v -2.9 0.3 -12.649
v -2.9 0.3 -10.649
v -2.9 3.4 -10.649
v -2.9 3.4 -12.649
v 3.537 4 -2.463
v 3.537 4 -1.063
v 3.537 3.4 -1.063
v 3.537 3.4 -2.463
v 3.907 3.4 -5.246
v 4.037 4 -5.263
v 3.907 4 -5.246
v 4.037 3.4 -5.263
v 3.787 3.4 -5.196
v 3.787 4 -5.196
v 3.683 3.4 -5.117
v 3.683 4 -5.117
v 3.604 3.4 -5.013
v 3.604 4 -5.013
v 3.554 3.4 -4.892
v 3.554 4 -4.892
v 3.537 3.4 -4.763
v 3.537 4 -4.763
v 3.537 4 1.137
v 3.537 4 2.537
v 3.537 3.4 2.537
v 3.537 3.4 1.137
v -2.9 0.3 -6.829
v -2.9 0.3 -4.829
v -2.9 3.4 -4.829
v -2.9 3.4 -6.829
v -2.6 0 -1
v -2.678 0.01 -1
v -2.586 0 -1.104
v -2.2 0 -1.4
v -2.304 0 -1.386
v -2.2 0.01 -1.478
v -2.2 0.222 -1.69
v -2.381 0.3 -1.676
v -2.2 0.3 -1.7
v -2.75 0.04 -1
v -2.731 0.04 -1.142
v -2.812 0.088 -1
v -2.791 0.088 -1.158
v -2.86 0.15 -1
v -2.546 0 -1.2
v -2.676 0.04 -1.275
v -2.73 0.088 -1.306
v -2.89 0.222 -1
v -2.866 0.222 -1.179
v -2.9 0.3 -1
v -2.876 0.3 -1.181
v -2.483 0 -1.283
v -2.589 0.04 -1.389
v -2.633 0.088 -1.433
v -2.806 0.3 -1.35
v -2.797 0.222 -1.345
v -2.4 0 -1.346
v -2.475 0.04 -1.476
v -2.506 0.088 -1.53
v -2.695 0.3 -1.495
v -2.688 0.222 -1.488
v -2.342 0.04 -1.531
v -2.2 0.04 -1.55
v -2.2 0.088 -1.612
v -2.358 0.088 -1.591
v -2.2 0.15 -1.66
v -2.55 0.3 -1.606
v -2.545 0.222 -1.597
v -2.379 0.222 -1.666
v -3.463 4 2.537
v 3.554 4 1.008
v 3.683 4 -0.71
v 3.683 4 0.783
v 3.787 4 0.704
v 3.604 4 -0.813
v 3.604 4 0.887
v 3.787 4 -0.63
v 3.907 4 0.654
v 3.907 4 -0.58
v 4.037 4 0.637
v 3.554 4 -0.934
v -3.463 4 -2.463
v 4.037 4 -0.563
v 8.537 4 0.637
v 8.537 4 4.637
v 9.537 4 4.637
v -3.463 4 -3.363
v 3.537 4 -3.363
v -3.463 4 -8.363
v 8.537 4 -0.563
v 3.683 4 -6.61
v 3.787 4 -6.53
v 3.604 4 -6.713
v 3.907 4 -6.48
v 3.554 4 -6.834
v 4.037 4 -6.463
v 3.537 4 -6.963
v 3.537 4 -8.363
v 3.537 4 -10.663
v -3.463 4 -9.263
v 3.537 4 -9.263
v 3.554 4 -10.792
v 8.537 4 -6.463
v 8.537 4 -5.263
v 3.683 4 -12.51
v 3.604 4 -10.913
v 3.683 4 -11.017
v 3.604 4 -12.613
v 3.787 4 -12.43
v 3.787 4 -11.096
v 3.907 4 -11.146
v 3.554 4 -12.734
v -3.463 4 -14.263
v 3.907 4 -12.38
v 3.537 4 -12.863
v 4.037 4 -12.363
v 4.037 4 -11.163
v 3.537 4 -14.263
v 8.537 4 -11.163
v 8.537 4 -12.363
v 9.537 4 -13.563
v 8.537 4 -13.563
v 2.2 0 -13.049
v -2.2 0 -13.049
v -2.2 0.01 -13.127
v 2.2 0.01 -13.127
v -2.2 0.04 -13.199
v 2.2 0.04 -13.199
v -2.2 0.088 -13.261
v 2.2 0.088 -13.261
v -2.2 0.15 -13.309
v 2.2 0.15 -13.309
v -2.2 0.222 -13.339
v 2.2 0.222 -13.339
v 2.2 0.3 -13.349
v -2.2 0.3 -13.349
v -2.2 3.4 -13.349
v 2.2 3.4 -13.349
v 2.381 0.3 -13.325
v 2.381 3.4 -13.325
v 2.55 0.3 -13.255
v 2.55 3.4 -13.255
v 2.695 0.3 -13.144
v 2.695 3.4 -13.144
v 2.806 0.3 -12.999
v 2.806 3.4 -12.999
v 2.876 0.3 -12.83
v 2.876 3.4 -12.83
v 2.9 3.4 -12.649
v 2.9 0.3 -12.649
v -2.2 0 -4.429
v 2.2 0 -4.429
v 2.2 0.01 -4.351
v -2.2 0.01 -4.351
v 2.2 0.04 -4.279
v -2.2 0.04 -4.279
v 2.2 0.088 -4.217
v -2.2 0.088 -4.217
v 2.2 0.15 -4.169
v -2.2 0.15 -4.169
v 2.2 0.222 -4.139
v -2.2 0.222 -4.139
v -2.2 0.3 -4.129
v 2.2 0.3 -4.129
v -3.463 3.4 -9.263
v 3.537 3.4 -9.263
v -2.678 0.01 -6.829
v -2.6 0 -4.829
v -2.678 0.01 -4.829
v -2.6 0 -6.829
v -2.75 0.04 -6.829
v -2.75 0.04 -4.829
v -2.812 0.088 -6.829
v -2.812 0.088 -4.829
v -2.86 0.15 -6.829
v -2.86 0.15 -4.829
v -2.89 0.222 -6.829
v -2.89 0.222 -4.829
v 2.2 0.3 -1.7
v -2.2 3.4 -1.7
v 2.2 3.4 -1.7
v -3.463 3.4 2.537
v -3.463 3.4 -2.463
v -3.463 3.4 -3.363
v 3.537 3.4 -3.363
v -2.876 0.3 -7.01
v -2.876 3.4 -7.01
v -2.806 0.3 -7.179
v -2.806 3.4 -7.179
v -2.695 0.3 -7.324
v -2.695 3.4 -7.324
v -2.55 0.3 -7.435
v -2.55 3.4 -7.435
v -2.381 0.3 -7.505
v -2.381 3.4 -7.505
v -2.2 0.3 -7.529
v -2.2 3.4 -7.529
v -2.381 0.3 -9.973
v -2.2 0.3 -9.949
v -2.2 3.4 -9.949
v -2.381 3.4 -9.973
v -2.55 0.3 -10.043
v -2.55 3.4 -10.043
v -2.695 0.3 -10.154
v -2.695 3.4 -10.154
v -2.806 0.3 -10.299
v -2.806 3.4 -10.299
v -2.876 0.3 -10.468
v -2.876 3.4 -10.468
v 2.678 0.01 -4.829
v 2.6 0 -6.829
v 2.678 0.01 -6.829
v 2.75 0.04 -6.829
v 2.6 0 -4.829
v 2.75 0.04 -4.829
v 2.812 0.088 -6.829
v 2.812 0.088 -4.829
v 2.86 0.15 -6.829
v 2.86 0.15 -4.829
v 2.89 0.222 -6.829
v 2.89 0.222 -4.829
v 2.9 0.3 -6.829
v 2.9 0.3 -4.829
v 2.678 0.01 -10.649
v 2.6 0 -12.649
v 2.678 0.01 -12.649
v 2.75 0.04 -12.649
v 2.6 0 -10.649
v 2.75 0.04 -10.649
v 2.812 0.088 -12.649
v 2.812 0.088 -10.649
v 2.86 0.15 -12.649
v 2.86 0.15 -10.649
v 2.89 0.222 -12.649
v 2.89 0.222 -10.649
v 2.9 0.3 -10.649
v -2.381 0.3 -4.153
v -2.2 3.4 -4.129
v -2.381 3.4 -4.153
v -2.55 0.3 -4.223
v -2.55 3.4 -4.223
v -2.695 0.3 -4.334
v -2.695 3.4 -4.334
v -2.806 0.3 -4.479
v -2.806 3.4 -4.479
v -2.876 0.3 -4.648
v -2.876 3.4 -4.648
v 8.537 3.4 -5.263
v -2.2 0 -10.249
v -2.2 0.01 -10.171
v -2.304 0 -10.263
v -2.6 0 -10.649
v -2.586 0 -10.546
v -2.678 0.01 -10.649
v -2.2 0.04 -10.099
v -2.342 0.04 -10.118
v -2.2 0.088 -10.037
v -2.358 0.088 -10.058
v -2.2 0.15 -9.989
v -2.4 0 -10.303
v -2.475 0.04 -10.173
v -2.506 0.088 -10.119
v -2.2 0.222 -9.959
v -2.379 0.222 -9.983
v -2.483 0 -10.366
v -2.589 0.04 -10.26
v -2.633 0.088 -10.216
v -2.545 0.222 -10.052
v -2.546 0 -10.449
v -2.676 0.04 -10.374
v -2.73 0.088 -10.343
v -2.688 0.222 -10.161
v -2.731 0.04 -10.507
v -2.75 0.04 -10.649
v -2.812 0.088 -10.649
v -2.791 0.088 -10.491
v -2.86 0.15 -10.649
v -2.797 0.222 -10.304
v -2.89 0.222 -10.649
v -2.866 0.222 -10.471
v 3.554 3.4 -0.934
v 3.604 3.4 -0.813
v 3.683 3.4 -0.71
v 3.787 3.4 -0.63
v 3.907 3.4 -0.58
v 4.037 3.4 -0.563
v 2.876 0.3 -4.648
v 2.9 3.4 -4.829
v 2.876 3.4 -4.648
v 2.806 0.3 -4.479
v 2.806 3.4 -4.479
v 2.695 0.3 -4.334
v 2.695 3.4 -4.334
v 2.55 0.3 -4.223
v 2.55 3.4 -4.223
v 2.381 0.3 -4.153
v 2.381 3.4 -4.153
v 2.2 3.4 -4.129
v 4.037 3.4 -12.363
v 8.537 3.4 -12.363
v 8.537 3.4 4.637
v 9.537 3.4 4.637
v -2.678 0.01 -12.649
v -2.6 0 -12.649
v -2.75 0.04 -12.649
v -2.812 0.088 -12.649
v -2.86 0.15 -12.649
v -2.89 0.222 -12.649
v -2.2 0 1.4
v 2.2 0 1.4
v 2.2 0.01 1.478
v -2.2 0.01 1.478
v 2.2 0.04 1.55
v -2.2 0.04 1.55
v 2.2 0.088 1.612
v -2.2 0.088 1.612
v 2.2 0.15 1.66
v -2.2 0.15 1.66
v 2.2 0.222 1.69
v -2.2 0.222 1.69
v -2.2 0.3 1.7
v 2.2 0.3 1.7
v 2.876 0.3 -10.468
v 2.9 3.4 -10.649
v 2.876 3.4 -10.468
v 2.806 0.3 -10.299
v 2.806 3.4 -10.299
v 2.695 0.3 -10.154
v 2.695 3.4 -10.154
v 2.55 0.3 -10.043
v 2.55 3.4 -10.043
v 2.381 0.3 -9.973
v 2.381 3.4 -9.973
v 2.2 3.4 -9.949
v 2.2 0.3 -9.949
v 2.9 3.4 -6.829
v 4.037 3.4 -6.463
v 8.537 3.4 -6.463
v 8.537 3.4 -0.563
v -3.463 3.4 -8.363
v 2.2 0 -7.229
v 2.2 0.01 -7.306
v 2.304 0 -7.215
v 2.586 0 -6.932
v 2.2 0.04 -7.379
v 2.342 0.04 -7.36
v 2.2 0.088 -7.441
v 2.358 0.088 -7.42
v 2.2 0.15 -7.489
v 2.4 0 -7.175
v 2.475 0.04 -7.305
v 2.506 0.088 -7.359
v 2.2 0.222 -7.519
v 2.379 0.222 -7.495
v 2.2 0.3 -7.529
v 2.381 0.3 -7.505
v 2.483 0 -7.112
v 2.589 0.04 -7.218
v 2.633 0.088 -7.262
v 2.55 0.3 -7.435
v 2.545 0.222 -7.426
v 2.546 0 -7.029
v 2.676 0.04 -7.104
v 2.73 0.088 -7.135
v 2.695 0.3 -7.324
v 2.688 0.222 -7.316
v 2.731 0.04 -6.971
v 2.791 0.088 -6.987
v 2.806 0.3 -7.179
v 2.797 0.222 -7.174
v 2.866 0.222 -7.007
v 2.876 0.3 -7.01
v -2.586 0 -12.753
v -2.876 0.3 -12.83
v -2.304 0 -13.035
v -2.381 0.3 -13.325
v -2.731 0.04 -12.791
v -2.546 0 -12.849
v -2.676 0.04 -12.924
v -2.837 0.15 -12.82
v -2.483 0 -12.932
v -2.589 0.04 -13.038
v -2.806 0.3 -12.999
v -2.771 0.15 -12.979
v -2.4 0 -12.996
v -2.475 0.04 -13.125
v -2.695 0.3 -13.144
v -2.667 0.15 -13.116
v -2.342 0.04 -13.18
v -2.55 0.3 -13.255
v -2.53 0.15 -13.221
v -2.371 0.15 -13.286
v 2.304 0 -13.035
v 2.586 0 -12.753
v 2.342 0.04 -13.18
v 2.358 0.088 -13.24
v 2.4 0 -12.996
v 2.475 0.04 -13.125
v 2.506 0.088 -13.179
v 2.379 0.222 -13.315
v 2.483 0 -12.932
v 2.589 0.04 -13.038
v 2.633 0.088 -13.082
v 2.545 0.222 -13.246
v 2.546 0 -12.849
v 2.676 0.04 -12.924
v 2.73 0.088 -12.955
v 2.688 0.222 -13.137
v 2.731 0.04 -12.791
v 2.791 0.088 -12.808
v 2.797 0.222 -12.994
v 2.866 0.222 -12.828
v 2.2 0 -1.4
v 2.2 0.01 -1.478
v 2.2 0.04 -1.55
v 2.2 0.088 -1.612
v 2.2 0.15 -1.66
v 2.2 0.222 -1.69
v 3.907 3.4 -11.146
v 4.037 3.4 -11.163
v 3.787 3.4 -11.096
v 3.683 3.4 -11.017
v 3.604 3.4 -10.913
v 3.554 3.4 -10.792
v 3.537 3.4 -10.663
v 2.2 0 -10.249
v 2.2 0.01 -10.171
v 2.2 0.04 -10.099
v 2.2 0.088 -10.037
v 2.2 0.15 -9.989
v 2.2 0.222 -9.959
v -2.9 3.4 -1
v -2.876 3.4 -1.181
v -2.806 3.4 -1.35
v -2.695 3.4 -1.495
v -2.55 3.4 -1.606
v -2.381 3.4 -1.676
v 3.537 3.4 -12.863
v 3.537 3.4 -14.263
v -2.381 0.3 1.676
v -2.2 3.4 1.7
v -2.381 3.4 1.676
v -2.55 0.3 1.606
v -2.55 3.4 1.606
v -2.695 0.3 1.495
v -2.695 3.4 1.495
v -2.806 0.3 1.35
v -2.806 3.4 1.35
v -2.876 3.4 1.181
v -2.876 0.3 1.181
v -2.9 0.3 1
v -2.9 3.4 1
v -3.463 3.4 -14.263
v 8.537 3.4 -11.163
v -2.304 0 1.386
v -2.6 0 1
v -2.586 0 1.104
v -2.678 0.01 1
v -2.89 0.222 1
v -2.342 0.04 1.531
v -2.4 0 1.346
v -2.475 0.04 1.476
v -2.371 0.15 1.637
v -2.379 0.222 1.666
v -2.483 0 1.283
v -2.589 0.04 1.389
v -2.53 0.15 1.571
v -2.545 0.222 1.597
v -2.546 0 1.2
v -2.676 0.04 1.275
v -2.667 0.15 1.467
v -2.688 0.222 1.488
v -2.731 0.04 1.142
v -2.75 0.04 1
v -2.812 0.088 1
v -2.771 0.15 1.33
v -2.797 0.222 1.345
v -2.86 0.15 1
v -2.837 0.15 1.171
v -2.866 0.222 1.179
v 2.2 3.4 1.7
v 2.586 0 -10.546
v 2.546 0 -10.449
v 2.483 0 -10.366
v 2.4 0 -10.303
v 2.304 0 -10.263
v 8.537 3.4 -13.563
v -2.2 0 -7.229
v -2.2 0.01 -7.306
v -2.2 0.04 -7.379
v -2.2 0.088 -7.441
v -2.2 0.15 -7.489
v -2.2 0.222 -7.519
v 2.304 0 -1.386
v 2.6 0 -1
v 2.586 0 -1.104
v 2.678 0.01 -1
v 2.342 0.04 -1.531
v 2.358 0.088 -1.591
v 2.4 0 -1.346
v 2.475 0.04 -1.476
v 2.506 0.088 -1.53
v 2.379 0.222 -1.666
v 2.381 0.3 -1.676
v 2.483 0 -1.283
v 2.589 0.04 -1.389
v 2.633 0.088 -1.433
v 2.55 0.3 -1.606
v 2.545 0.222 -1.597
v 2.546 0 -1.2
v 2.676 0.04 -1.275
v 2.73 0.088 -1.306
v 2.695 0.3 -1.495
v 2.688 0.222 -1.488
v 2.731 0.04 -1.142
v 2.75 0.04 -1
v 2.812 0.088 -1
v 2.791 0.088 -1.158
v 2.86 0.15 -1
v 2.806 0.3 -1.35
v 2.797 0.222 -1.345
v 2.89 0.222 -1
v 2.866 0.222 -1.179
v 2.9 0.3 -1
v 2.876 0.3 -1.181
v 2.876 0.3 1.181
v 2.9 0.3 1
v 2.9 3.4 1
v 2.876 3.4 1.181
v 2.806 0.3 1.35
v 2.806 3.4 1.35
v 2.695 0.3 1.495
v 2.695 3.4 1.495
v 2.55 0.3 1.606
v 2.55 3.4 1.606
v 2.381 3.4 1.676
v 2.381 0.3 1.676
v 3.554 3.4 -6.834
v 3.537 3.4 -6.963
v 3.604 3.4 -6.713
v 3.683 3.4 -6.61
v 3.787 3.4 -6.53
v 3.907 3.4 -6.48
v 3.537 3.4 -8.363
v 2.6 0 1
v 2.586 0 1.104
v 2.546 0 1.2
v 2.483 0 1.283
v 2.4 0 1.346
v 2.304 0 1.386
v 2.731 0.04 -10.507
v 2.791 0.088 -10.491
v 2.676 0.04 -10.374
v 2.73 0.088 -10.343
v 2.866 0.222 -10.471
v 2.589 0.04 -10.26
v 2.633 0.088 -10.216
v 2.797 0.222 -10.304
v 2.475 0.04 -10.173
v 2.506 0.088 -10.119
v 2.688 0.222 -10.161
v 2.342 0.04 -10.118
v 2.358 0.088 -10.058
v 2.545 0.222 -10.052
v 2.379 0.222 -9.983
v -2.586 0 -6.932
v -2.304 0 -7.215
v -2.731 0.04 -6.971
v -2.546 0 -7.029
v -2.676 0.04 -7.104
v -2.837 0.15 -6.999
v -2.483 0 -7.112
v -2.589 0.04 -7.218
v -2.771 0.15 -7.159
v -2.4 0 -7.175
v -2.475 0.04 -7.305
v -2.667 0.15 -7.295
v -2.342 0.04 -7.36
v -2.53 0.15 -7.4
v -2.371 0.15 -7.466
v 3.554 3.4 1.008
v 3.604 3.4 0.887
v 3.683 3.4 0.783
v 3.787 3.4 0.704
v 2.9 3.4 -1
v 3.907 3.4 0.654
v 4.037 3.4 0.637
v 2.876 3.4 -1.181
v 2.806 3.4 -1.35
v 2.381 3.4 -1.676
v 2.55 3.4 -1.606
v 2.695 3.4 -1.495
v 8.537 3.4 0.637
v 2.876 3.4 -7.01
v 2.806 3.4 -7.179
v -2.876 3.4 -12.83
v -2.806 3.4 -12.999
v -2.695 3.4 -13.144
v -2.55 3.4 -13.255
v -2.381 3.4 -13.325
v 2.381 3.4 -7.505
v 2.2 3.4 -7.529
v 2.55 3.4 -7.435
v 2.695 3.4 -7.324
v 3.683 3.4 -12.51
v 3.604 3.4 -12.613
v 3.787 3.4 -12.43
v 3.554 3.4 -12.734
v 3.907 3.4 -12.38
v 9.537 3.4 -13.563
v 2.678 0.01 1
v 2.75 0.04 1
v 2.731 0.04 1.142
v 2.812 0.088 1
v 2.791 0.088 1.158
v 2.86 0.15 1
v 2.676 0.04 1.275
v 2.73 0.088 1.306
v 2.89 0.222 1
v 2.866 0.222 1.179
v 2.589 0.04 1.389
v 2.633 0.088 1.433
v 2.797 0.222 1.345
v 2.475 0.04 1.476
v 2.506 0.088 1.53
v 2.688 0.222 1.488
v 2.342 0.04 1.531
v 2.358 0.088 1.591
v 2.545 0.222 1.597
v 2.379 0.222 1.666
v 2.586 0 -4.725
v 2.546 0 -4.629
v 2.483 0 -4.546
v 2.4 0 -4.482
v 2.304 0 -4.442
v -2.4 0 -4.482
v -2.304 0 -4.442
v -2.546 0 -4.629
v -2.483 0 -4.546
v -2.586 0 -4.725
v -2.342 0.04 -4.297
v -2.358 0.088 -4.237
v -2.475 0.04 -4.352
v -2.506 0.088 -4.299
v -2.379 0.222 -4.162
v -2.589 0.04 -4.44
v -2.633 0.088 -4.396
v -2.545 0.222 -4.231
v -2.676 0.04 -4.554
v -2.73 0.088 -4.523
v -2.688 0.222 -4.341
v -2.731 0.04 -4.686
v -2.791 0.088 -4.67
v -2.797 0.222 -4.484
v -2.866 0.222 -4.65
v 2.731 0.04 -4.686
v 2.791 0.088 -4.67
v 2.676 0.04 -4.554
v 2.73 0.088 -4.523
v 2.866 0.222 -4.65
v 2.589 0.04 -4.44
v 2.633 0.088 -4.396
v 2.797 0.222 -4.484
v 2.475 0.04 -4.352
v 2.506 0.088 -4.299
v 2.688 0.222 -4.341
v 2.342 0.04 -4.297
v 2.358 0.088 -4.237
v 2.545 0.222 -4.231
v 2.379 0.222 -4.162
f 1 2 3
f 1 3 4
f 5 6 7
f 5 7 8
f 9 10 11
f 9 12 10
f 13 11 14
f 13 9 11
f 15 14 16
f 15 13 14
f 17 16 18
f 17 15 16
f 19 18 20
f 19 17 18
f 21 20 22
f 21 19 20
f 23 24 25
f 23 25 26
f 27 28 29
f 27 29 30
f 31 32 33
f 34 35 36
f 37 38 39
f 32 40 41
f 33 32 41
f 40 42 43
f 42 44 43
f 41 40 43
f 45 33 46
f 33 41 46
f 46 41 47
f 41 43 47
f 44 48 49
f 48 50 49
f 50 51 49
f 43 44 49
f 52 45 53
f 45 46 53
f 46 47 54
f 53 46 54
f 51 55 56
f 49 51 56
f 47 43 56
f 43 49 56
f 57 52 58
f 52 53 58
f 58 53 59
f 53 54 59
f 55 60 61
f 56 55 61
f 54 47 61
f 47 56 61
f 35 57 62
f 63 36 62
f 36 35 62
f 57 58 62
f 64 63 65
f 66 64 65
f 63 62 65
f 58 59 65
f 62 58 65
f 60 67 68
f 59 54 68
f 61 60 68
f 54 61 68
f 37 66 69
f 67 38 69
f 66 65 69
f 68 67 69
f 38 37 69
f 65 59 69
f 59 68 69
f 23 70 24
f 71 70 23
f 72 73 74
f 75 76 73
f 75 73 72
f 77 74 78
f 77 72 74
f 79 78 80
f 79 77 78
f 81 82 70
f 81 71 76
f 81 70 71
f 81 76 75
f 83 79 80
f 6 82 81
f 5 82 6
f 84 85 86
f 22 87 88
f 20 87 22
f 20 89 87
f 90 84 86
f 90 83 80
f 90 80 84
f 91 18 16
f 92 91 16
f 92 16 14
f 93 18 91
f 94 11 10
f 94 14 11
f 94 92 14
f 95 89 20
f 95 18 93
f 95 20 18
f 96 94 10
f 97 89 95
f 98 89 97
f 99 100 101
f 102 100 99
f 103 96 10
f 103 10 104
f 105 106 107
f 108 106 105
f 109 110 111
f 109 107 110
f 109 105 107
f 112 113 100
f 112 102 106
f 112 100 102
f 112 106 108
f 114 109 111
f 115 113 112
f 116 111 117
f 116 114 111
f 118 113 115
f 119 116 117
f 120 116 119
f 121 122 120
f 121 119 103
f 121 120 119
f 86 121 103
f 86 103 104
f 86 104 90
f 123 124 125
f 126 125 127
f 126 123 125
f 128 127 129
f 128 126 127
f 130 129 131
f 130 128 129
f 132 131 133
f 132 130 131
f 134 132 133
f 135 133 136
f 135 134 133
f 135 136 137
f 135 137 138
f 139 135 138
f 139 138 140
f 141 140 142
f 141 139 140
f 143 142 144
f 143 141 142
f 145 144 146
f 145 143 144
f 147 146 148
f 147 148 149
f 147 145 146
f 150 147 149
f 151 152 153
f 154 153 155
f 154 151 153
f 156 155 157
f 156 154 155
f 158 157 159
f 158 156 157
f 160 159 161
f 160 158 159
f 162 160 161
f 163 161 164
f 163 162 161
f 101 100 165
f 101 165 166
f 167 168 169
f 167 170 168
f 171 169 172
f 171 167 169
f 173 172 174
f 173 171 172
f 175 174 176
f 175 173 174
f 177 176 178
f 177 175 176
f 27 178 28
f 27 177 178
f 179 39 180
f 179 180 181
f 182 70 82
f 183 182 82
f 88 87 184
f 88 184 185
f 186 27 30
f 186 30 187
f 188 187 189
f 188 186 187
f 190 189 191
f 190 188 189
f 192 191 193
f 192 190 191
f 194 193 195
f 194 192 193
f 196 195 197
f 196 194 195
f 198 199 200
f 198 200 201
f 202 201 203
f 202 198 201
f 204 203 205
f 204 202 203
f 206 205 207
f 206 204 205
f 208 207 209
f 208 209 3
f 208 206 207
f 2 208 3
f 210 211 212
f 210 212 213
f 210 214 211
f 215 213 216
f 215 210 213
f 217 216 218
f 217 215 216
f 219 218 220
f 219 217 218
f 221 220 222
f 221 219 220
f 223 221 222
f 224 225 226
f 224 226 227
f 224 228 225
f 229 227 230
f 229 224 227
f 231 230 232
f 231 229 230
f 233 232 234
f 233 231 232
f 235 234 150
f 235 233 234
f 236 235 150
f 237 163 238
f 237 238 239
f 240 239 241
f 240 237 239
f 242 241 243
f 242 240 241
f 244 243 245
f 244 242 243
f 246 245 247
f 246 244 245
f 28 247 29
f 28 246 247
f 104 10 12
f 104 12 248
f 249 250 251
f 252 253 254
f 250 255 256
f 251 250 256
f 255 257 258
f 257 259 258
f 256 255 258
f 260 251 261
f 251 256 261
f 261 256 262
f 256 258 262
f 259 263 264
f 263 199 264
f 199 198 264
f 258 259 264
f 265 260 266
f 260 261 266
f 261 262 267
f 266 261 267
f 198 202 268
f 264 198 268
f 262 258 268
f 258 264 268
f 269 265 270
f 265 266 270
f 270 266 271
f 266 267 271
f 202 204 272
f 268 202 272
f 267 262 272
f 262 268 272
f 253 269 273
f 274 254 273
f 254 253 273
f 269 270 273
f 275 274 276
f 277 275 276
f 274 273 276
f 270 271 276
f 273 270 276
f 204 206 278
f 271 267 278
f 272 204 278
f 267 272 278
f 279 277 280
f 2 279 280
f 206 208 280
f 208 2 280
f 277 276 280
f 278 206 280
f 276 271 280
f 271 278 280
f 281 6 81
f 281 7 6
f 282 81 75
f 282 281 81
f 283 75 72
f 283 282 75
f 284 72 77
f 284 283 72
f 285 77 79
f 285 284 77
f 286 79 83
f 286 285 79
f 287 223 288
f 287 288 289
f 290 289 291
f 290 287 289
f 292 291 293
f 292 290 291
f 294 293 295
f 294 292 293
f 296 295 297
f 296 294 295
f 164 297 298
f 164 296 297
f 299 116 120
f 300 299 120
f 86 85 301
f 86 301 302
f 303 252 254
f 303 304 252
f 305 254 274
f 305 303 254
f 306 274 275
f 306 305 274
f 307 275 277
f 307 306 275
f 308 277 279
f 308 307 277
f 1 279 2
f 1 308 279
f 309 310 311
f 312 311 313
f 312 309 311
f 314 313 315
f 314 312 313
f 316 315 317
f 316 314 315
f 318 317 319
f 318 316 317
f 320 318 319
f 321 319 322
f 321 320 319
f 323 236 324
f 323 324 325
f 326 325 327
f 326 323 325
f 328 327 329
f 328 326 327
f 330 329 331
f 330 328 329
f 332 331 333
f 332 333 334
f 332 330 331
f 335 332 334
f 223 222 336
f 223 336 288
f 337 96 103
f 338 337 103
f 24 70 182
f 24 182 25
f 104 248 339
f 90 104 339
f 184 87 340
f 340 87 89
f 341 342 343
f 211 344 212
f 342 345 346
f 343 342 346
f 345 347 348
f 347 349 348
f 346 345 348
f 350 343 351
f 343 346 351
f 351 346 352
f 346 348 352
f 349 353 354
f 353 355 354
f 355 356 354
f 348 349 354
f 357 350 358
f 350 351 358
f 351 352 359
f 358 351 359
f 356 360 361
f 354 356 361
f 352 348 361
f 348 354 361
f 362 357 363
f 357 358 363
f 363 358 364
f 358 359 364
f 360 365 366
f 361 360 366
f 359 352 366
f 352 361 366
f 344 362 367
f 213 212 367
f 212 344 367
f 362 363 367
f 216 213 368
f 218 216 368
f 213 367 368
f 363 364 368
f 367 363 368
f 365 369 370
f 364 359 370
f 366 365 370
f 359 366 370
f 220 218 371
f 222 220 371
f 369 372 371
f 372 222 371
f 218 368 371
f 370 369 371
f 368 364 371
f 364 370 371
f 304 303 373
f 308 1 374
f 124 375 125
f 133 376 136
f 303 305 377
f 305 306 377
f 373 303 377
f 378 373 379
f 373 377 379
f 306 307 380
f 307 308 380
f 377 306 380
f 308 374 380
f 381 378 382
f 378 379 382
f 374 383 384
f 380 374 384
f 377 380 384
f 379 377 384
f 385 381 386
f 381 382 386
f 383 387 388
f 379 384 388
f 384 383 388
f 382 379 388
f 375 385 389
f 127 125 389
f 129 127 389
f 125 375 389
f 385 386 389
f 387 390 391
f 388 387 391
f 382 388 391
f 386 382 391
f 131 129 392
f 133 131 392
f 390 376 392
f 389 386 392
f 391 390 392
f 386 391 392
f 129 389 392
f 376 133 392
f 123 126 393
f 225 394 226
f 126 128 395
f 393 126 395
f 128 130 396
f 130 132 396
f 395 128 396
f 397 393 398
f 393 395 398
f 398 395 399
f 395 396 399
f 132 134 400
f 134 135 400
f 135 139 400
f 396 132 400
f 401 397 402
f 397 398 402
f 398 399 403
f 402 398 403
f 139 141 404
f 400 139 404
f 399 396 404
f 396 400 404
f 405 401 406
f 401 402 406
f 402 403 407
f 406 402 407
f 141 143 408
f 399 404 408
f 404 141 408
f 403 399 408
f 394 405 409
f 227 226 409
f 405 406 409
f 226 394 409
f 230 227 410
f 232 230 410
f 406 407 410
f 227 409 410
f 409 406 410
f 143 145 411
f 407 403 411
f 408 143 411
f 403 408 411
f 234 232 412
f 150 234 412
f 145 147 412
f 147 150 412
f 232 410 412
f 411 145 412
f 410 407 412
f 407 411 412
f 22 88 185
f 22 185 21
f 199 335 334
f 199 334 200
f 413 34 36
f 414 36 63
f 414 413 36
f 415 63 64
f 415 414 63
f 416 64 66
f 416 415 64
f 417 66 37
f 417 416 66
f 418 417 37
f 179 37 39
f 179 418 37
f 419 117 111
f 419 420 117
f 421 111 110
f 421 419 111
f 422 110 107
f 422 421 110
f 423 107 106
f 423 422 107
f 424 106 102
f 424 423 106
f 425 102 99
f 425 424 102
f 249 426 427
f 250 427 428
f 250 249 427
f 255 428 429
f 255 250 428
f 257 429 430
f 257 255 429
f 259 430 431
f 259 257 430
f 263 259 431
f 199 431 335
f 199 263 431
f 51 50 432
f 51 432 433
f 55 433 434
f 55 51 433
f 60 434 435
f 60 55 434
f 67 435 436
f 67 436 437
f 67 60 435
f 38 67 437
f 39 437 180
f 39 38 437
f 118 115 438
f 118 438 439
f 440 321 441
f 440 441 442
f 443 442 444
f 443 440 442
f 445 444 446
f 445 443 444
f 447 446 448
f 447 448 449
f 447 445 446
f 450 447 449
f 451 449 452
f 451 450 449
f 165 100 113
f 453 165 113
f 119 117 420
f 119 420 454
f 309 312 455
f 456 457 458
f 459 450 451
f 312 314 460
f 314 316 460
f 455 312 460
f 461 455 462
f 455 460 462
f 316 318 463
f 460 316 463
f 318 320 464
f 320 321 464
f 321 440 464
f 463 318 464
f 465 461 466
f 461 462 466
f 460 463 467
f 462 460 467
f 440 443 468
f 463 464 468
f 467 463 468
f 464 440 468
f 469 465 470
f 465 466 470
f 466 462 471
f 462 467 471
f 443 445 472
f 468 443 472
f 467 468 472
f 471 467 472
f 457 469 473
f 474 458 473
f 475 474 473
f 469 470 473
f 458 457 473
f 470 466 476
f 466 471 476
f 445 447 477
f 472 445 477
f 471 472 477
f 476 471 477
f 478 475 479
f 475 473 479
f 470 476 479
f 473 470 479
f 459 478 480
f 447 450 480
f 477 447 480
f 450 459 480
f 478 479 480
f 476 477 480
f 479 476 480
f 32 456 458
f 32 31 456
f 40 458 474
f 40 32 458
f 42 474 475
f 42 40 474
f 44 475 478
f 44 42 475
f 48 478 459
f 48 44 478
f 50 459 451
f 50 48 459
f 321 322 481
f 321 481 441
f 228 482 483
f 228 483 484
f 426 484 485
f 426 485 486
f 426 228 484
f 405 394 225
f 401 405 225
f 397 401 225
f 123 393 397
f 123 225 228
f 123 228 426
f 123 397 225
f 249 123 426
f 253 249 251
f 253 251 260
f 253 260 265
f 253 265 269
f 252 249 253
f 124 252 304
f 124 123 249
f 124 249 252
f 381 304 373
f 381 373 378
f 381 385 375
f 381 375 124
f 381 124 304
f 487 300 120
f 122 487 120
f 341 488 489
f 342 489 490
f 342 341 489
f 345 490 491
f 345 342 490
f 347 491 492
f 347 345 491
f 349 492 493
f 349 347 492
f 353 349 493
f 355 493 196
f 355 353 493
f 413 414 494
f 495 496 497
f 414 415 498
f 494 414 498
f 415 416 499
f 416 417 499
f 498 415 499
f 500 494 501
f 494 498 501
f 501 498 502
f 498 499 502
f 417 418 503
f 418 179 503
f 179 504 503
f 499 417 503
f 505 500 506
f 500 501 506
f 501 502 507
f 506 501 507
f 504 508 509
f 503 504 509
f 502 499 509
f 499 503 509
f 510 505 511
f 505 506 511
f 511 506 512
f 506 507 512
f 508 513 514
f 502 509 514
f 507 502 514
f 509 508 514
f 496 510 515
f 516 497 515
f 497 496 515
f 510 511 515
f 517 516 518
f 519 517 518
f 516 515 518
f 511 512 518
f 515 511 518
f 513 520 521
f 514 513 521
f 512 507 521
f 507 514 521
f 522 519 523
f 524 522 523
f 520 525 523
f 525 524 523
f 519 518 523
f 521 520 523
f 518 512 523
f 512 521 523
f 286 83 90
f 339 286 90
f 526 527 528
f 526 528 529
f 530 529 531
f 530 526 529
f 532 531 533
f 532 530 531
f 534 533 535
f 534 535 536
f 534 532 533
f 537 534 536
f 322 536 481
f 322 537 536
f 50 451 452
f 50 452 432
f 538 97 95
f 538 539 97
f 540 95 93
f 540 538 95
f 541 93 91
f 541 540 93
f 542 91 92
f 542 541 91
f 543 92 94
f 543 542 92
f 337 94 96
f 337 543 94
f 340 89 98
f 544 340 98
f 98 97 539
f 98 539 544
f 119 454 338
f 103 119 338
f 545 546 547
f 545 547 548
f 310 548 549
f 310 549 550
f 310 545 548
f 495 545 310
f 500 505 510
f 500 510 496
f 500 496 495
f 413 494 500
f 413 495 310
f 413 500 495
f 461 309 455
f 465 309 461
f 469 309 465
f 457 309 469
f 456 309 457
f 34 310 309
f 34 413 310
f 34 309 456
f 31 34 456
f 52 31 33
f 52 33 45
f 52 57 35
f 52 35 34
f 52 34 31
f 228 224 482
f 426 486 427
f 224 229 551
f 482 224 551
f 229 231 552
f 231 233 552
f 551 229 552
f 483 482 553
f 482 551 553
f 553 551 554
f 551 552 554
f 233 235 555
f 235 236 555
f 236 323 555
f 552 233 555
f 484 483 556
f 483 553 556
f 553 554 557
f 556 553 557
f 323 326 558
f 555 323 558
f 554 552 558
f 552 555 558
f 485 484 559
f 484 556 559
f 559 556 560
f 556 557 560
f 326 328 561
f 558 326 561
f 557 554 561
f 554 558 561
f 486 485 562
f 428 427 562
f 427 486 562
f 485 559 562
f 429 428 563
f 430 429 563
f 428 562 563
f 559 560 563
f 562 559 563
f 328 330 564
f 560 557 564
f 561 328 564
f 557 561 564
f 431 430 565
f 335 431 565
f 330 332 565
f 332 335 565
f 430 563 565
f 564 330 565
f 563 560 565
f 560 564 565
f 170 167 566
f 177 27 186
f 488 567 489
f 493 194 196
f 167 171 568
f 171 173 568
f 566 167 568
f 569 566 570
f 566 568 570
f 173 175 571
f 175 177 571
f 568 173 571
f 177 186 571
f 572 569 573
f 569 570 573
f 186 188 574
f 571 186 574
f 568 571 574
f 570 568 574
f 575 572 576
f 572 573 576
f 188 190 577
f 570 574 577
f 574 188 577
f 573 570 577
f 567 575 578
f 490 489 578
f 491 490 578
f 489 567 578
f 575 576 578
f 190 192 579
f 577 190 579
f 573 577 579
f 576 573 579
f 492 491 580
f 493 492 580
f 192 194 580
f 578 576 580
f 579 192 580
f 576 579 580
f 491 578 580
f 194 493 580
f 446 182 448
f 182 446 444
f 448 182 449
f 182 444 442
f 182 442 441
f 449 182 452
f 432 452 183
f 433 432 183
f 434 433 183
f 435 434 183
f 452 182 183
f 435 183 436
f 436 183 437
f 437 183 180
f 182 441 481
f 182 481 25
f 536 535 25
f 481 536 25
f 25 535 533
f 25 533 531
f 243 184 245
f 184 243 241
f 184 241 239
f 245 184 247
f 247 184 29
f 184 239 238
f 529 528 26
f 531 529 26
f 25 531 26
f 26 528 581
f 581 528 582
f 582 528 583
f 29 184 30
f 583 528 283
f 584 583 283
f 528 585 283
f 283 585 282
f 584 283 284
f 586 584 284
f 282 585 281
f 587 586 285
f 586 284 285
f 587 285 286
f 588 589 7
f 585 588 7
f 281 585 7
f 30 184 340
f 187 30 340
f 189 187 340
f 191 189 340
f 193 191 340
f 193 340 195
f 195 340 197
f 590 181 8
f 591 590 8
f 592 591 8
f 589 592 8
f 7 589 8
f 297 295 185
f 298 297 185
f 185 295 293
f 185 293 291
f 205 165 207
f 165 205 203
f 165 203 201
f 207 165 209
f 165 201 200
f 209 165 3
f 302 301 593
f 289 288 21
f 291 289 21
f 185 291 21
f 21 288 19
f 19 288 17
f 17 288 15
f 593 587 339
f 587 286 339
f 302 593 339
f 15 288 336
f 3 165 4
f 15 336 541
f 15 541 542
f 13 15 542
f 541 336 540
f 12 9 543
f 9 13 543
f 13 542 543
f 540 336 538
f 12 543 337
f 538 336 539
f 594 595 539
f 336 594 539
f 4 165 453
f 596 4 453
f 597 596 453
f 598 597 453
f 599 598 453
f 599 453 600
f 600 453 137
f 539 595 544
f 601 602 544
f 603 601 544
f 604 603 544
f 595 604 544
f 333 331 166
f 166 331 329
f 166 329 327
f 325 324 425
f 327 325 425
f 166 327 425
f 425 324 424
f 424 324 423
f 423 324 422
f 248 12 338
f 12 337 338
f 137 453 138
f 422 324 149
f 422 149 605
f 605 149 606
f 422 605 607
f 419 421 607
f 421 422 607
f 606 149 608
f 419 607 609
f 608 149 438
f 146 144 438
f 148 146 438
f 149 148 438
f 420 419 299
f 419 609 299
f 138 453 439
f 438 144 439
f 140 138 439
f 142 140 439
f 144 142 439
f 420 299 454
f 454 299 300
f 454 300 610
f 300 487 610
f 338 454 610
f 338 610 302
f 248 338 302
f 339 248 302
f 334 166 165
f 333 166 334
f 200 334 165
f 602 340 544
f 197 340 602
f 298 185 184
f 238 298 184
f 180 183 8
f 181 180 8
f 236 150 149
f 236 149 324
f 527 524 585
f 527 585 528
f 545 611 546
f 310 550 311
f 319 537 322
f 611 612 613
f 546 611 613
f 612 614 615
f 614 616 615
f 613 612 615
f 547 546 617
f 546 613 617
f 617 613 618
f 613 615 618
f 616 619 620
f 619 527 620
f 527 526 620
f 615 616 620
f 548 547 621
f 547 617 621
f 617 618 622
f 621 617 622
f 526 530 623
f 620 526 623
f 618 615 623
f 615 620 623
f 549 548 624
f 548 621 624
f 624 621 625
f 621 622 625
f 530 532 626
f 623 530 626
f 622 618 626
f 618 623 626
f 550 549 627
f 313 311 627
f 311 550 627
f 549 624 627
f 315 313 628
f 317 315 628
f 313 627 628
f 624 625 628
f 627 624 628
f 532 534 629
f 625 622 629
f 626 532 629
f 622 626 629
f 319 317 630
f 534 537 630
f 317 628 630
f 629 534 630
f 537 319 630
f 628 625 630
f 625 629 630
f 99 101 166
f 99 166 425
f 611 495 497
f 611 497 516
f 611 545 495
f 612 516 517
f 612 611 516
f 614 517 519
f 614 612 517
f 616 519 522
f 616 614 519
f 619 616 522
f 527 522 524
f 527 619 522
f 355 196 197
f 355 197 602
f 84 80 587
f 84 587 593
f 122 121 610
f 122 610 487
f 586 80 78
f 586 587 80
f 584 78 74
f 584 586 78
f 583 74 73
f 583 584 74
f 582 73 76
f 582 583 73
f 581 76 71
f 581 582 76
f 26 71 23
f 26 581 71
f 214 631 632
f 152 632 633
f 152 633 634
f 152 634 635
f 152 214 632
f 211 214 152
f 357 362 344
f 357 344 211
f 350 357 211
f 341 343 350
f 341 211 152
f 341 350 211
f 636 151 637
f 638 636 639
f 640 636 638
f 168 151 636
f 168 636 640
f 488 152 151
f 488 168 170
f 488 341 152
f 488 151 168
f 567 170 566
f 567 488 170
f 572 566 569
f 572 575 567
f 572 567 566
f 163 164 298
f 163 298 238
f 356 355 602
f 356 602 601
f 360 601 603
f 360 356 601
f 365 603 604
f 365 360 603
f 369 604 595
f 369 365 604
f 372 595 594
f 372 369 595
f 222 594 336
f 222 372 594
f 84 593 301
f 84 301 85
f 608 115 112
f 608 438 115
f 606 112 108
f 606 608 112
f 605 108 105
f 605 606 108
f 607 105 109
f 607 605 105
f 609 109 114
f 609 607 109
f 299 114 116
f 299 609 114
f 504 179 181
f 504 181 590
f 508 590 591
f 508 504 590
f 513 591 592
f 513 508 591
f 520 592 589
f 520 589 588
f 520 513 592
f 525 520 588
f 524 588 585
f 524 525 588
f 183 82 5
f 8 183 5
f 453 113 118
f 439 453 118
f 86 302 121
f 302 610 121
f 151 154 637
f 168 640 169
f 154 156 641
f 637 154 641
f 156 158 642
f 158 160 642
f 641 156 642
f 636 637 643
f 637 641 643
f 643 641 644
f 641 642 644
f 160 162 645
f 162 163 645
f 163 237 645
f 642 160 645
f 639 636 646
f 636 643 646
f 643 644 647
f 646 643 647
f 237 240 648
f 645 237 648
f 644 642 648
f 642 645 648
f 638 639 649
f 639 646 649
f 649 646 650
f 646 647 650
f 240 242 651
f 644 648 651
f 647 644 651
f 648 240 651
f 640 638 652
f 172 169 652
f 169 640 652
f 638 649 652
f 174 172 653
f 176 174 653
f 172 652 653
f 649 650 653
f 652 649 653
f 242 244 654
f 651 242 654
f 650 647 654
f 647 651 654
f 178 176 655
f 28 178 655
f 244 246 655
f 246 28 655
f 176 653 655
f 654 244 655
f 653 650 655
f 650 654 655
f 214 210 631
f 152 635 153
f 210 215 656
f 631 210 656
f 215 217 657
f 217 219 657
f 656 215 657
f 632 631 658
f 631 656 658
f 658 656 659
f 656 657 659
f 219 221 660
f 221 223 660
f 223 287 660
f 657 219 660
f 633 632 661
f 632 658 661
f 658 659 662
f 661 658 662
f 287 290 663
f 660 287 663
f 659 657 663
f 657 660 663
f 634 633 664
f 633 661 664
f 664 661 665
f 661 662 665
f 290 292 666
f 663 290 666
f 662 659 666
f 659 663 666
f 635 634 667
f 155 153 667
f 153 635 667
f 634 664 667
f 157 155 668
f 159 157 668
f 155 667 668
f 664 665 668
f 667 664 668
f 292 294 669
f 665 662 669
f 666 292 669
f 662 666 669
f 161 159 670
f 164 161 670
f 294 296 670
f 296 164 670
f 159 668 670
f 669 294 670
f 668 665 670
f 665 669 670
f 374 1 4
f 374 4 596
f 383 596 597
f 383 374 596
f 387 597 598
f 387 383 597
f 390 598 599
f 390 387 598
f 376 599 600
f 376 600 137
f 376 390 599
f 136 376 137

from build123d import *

# Parameters (mm, degrees)
EXTRUDE_1_DEPTH   = 4
EXTRUDE_1_2_DEPTH = 4
EXTRUDE_1_3_DEPTH = 4
SKETCH_2_W        = 7
SKETCH_2_H        = 5
EXTRUDE_2_DEPTH   = 0.6
SKETCH_3_W        = 6
SKETCH_3_H        = 1.2
EXTRUDE_3_DEPTH   = 0.6
SKETCH_4_W        = 1
SKETCH_4_H        = 13
EXTRUDE_4_DEPTH   = 0.6
FILLET_1_R        = 0.5
SKETCH_5_W        = 1
SKETCH_5_H        = 0.6
EXTRUDE_5_DEPTH   = 1.2
FILLET_2_R        = 0.3
SKETCH_7_W        = 1
SKETCH_7_H        = 0.6
EXTRUDE_6_DEPTH   = 4


with BuildPart() as part:
    # 草图1 → 凸台-拉伸1 (new body)
    with BuildSketch(Plane(origin=(0, 0, 0), x_dir=(1, 0, 0), z_dir=(0, 1, 0))):
        with BuildLine():
            Line((-2.2, 1.7), (2.2, 1.7))
            ThreePointArc((2.2, 1.7), (2.694974747, 1.494974747), (2.9, 1))
            Line((2.9, 1), (2.9, -1))
            ThreePointArc((2.9, -1), (2.694974747, -1.494974747), (2.2, -1.7))
            Line((2.2, -1.7), (-2.2, -1.7))
            ThreePointArc((-2.2, -1.7), (-2.694974747, -1.494974747), (-2.9, -1))
            Line((-2.9, -1), (-2.9, 1))
            ThreePointArc((-2.9, 1), (-2.694974747, 1.494974747), (-2.2, 1.7))
        make_face()
    extrude(amount=EXTRUDE_1_DEPTH)



with BuildPart() as body_2:
    # 草图1 → Extrude 1 2 (new body)
    with BuildSketch(Plane(origin=(0, 0, 0), x_dir=(1, 0, 0), z_dir=(0, 1, 0))):
        with BuildLine():
            Line((-2.2, 7.528722779), (2.2, 7.528722779))
            ThreePointArc((2.2, 7.528722779), (2.694974747, 7.323697526), (2.9, 6.828722779))
            Line((2.9, 6.828722779), (2.9, 4.828722779))
            ThreePointArc((2.9, 4.828722779), (2.694974747, 4.333748032), (2.2, 4.128722779))
            Line((2.2, 4.128722779), (-2.2, 4.128722779))
            ThreePointArc((-2.2, 4.128722779), (-2.694974747, 4.333748032), (-2.9, 4.828722779))
            Line((-2.9, 4.828722779), (-2.9, 6.828722779))
            ThreePointArc((-2.9, 6.828722779), (-2.694974747, 7.323697526), (-2.2, 7.528722779))
        make_face()
    extrude(amount=EXTRUDE_1_2_DEPTH)


with BuildPart() as body_3:
    # 草图1 → Extrude 1 3 (new body)
    with BuildSketch(Plane(origin=(0, 0, 0), x_dir=(1, 0, 0), z_dir=(0, 1, 0))):
        with BuildLine():
            Line((-2.2, 13.349128593), (2.2, 13.349128593))
            ThreePointArc((2.2, 13.349128593), (2.694974747, 13.144103339), (2.9, 12.649128593))
            Line((2.9, 12.649128593), (2.9, 10.649128593))
            ThreePointArc((2.9, 10.649128593), (2.694974747, 10.154153846), (2.2, 9.949128593))
            Line((2.2, 9.949128593), (-2.2, 9.949128593))
            ThreePointArc((-2.2, 9.949128593), (-2.694974747, 10.154153846), (-2.9, 10.649128593))
            Line((-2.9, 10.649128593), (-2.9, 12.649128593))
            ThreePointArc((-2.9, 12.649128593), (-2.694974747, 13.144103339), (-2.2, 13.349128593))
        make_face()
    extrude(amount=EXTRUDE_1_3_DEPTH)


with BuildPart() as part_1:
    add(part.part)

    add(body_2.part)  # 凸台-拉伸2 merges body 2

    add(body_3.part)  # 凸台-拉伸2 merges body 3
    # 草图2 → 凸台-拉伸2 (add)
    with BuildSketch(Plane(origin=(0, 4, 0), x_dir=(1, 0, 0), z_dir=(0, 1, 0))):
        with Locations((0.036699987, 11.763062551)):
            Rectangle(SKETCH_2_W, SKETCH_2_H)
        with Locations((0.036699987, 5.863062551)):
            Rectangle(SKETCH_2_W, SKETCH_2_H)
        with Locations((0.036699987, -0.036937449)):
            Rectangle(SKETCH_2_W, SKETCH_2_H)
    extrude(amount=-EXTRUDE_2_DEPTH)

    # 草图3 → 凸台-拉伸3 (add)
    with BuildSketch(Plane(origin=(0, 4, 0), x_dir=(1, 0, 0), z_dir=(0, 1, 0))):
        with Locations((6.536699987, 11.763062551)):
            Rectangle(SKETCH_3_W, SKETCH_3_H)
        with Locations((6.536699987, 5.863062551)):
            Rectangle(SKETCH_3_W, SKETCH_3_H)
        with Locations((6.536699987, -0.036937449)):
            Rectangle(SKETCH_3_W, SKETCH_3_H)
    extrude(amount=-EXTRUDE_3_DEPTH)

    # 草图4 → 凸台-拉伸4 (add)
    with BuildSketch(Plane.XZ.offset(-3.4)):
        with Locations((9.036699987, -5.863062551)):
            Rectangle(SKETCH_4_W, SKETCH_4_H)
    extrude(amount=-EXTRUDE_4_DEPTH)

    # 圆角1
    fillet_1_edges = [part_1.edges().sort_by_distance(p)[0] for p in [
        (3.536699987, 3.7, -11.163062551),
        (3.536699987, 3.7, -12.363062551),
        (3.536699987, 3.7, 0.636937449),
        (3.536699987, 3.7, -0.563062551),
        (3.536699987, 3.7, -5.263062551),
        (3.536699987, 3.7, -6.463062551),
    ]]
    fillet(fillet_1_edges, radius=FILLET_1_R)

    # 草图5 → 凸台-拉伸5 (add)
    with BuildSketch(Plane(origin=(0, 0, -12.363062551), x_dir=(-1, 0, 0), z_dir=(0, 0, -1))):
        with Locations((-9.036699987, 3.7)):
            Rectangle(SKETCH_5_W, SKETCH_5_H)
    extrude(amount=EXTRUDE_5_DEPTH)

    # 圆角2
    fillet_2_edges = [part_1.edges().sort_by_distance(p)[0] for p in [
        (-2.9, 0, 0),
        (-2.694974747, 0, -1.494974747),
        (-2.694974747, 0, -13.144103339),
        (-2.9, 0, -11.649128593),
        (-2.694974747, 0, -10.154153846),
        (0, 0, -9.949128593),
        (2.694974747, 0, -10.154153846),
        (2.9, 0, -11.649128593),
        (2.694974747, 0, -13.144103339),
        (0, 0, -13.349128593),
        (0, 0, -1.7),
        (2.694974747, 0, -1.494974747),
        (2.9, 0, 0),
        (2.694974747, 0, 1.494974747),
        (-2.694974747, 0, -7.323697526),
        (-2.9, 0, -5.828722779),
        (-2.694974747, 0, -4.333748032),
        (0, 0, -4.128722779),
        (2.694974747, 0, -4.333748032),
        (2.9, 0, -5.828722779),
        (2.694974747, 0, -7.323697526),
        (0, 0, 1.7),
        (0, 0, -7.528722779),
        (-2.694974747, 0, 1.494974747),
    ]]
    fillet(fillet_2_edges, radius=FILLET_2_R)

    # 草图7 → 凸台-拉伸6 (add)
    with BuildSketch(Plane.XY.offset(0.636937449)):
        with Locations((9.036699987, 3.7)):
            Rectangle(SKETCH_7_W, SKETCH_7_H)
    extrude(amount=EXTRUDE_6_DEPTH)


solid = part_1.part
